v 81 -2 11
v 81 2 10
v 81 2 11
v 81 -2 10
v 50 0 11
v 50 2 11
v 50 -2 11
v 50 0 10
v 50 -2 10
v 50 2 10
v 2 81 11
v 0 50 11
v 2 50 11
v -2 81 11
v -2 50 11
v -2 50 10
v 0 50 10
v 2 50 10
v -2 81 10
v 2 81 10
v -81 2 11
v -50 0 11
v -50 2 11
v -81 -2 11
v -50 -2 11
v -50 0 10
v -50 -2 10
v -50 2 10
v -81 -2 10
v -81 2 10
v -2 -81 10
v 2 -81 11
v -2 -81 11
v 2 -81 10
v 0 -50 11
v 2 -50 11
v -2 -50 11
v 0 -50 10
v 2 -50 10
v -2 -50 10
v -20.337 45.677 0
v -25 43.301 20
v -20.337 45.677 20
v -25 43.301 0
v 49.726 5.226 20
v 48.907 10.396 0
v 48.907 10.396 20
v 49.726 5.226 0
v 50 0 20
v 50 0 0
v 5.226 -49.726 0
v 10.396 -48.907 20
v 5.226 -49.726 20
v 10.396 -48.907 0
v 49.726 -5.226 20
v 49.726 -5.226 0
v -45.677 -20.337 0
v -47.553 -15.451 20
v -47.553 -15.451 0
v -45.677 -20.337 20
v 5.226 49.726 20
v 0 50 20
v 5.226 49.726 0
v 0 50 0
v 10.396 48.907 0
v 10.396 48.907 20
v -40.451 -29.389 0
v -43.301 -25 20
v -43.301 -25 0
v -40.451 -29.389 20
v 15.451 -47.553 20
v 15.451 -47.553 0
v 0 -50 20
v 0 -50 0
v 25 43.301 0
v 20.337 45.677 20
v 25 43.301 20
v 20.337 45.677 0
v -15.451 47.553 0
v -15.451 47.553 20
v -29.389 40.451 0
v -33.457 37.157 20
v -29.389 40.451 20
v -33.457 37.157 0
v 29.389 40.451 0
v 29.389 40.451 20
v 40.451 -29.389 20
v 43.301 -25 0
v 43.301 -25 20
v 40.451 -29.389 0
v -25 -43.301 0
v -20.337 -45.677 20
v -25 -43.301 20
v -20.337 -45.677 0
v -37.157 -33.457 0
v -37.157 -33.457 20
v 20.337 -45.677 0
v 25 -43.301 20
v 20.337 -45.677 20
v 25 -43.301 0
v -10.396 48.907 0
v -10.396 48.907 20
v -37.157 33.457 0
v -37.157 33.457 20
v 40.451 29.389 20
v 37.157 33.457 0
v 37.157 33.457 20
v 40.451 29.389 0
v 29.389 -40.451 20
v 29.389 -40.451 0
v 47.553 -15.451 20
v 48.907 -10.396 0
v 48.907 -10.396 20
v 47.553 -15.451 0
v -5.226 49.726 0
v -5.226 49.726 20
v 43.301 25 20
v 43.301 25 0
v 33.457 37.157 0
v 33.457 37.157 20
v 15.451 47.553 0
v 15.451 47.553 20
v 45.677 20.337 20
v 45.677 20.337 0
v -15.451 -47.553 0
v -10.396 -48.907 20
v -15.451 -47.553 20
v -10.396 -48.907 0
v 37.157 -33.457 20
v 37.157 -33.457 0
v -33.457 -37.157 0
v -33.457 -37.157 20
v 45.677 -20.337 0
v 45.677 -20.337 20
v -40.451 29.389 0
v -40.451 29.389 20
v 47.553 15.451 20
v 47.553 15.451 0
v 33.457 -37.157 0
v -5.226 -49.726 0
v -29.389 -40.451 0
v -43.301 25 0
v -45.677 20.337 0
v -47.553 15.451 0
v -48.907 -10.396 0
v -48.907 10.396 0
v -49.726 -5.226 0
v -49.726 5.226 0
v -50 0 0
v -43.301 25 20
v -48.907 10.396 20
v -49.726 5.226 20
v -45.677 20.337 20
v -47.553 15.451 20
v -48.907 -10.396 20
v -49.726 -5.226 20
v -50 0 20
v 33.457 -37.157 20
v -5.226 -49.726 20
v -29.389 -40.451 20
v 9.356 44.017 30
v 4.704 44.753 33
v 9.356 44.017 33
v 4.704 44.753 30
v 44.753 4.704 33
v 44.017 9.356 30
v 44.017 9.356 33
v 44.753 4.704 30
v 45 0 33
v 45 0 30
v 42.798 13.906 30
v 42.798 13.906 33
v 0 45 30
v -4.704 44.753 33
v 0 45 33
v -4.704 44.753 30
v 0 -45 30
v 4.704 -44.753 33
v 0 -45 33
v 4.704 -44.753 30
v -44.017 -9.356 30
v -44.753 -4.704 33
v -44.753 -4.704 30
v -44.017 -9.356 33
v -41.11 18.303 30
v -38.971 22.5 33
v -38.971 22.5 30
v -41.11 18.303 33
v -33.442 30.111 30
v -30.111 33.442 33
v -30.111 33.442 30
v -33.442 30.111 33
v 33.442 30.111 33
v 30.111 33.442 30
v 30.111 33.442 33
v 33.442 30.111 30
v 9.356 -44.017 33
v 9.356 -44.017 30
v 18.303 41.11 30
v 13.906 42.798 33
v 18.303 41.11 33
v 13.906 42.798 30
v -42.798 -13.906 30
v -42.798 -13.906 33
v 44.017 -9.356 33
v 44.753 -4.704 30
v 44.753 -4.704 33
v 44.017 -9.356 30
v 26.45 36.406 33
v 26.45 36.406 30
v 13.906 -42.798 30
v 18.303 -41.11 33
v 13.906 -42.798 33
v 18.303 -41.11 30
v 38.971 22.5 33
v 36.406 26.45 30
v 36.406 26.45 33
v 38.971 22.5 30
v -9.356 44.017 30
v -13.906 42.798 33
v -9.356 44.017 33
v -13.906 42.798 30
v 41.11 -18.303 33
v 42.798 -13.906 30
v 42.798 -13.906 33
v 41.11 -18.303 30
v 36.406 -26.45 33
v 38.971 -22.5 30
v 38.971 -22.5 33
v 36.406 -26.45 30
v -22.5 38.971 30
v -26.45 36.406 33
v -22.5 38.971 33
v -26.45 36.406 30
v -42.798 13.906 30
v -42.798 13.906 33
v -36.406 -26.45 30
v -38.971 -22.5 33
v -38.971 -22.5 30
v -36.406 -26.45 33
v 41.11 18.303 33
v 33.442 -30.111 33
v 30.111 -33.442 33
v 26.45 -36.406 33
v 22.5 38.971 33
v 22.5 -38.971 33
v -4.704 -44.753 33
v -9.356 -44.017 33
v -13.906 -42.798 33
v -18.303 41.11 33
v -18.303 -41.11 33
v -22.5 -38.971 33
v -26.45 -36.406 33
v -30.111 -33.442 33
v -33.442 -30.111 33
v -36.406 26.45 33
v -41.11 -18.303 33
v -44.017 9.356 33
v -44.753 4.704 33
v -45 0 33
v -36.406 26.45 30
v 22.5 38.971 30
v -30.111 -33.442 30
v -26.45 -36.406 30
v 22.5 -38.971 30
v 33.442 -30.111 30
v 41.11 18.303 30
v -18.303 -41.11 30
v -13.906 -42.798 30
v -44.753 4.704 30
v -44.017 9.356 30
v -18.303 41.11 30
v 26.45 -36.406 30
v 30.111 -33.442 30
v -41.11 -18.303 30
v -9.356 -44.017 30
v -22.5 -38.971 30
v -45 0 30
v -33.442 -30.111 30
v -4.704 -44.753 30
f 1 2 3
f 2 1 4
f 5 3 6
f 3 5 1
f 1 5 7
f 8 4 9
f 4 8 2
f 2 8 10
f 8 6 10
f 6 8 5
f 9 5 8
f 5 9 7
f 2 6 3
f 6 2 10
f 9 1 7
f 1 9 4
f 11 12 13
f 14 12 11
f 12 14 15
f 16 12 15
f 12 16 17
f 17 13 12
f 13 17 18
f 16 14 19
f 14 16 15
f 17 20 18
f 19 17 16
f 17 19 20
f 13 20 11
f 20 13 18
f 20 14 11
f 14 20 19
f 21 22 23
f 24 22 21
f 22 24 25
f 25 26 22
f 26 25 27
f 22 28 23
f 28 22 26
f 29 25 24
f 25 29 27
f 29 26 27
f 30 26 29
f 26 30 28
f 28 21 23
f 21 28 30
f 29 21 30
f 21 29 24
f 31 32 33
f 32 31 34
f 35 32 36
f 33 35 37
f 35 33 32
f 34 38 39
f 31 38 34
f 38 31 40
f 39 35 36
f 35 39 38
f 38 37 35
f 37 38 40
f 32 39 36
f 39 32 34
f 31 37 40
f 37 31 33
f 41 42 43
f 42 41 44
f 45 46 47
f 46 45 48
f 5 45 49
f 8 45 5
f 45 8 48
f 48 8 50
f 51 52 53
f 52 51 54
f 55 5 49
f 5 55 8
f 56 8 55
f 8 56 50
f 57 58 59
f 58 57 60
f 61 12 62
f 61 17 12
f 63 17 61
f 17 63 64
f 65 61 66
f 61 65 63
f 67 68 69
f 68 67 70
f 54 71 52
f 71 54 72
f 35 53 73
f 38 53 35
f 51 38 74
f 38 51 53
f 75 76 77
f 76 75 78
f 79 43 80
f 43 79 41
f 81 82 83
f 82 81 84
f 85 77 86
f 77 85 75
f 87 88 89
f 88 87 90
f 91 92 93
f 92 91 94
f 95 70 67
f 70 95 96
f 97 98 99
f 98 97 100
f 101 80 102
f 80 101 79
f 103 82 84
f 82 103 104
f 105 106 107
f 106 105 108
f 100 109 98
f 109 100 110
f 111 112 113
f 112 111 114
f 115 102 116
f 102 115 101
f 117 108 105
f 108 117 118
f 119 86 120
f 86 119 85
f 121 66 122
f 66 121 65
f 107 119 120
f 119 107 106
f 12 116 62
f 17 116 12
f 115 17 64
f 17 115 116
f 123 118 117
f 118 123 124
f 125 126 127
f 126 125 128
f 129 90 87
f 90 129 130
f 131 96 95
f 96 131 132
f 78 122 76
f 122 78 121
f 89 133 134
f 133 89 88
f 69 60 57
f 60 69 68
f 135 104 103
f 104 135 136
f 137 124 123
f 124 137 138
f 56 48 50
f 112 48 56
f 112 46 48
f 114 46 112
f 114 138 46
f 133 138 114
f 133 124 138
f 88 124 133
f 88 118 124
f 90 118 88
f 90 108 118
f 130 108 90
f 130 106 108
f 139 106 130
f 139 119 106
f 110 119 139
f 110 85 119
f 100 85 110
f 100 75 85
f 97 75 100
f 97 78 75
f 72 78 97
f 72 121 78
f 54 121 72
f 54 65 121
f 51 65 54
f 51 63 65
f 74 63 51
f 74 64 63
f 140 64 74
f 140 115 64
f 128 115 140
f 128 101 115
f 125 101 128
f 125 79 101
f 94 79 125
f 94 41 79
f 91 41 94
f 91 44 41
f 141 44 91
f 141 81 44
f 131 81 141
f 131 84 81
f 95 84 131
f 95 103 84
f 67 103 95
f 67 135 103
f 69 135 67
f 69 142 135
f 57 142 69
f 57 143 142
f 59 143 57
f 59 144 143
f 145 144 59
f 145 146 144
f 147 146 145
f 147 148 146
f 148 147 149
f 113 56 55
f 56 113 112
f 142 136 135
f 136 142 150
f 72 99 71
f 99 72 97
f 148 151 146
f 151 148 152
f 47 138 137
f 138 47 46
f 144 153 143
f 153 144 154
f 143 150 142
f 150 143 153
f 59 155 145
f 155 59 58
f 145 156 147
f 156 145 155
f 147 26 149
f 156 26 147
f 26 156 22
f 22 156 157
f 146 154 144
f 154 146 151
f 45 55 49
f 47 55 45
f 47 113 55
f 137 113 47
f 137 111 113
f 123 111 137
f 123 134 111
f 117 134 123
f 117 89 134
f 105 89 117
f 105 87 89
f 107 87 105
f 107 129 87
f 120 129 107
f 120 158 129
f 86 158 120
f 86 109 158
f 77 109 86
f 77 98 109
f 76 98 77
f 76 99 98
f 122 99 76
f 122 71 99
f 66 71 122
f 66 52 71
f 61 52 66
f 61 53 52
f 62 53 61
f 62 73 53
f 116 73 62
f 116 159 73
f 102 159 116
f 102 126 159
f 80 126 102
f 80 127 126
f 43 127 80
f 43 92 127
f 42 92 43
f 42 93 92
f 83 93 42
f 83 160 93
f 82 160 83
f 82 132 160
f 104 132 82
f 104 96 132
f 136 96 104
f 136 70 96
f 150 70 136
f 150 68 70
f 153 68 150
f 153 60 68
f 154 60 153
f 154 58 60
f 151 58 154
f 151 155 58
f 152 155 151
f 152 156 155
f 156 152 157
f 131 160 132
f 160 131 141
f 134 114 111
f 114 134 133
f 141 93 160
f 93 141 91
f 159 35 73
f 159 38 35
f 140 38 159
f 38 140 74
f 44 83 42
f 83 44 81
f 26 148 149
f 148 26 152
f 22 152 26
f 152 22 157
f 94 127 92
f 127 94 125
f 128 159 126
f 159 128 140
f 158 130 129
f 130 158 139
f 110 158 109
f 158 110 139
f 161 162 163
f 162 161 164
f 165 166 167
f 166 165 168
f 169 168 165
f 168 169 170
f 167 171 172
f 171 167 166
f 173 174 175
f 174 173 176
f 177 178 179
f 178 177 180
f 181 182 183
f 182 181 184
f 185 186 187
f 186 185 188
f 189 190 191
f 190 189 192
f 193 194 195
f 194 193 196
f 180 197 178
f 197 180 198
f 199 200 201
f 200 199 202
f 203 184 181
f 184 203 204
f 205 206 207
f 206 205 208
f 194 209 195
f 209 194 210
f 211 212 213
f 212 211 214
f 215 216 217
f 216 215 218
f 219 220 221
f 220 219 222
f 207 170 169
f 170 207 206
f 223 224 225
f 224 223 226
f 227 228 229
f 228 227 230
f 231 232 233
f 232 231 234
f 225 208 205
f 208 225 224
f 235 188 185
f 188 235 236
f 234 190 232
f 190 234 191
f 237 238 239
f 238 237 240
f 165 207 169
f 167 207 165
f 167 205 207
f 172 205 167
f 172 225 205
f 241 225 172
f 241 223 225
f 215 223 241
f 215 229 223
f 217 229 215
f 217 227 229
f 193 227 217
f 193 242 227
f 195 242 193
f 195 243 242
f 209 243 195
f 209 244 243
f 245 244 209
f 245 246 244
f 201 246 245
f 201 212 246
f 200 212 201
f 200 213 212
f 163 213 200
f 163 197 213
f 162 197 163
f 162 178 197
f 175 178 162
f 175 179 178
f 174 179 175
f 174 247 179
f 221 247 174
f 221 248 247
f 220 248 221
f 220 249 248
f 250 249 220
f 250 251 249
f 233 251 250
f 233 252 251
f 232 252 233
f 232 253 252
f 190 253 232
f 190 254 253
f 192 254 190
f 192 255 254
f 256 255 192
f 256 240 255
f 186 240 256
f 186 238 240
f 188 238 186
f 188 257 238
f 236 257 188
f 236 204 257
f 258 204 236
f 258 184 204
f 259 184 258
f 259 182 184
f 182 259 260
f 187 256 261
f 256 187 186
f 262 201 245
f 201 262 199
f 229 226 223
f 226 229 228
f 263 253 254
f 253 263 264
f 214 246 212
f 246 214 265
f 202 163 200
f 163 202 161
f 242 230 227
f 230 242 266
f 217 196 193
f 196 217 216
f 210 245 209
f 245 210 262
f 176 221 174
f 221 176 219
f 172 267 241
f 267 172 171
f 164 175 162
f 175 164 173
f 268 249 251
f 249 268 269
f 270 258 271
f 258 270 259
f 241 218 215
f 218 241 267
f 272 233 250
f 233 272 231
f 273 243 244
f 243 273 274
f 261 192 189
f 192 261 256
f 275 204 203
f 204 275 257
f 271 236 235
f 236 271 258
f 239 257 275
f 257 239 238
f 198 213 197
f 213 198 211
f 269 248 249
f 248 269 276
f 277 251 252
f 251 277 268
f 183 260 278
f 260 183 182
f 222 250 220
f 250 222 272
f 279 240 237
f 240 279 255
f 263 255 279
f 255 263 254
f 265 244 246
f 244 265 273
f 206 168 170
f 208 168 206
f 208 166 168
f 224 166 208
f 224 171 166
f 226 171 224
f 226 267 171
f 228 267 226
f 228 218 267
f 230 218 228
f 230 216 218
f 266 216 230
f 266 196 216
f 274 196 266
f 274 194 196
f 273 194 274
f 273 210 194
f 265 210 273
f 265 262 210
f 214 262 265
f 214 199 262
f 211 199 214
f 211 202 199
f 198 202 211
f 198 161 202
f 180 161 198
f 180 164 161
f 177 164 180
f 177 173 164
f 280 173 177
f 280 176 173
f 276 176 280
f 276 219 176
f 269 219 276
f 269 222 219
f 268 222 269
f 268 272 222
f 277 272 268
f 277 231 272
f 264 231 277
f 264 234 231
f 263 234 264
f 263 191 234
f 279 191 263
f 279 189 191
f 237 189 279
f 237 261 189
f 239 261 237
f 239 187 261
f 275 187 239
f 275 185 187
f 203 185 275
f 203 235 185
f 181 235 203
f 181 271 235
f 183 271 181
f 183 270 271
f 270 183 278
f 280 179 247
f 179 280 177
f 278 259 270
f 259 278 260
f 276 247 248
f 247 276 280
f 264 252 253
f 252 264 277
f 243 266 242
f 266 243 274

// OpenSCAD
// puck_antenna.scad
// Parametric model for a ground-level puck antenna with a solar panel array

// === Parameters ===
// Housing
puck_radius = 50.0;
puck_height = 20.0;
ground_clearance = 0.0; // 0 means flush with ground, negative means buried

// Solar Panel
panel_radius = 45.0;
panel_thickness = 3.0;
panel_height_above_puck = 10.0; // Clearance gap

// Antenna Elements
num_antennas = 4; // Supported: 2 or 4
antenna_length = 31.0; // ~1/4 wavelength at 2.4GHz
antenna_width = 4.0;
antenna_thickness = 1.0;
antenna_angle_offset = 0.0; // Degrees to tilt the antenna upwards

$fn = 60;

module solar_panel() {
    translate([0, 0, puck_height + panel_height_above_puck])
    cylinder(h=panel_thickness, r=panel_radius);
}

module puck_housing() {
    translate([0, 0, 0])
    cylinder(h=puck_height, r=puck_radius);
}

module antenna_element() {
    // A simple rectangular patch/trace antenna element extending outwards
    translate([puck_radius, -antenna_width/2, puck_height/2])
    rotate([0, -antenna_angle_offset, 0])
    cube([antenna_length, antenna_width, antenna_thickness]);
}

module antenna_array() {
    angle_step = 360 / num_antennas;
    for (i = [0 : num_antennas - 1]) {
        rotate([0, 0, i * angle_step])
        antenna_element();
    }
}

module assembly() {
    // Translate the entire assembly based on ground clearance
    translate([0, 0, ground_clearance]) {
        union() {
            puck_housing();
            solar_panel();
            antenna_array();
        }
    }
}

// Generate the assembly
assembly();
